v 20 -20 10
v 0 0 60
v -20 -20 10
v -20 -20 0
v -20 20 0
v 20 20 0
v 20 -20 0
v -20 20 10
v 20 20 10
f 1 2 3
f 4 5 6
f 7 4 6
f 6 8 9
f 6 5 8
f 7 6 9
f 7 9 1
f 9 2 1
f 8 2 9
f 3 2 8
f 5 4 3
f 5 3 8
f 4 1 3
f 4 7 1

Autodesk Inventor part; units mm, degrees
ref_plane "YZ Plane" through (0, 0, 0) normal (1, 0, 0) x (0, 1, 0)
ref_plane "XZ Plane" through (0, 0, 0) normal (0, 1, 0) x (-1, 0, 0)
ref_plane "XY Plane" through (0, 0, 0) normal (0, 0, 1) x (1, 0, 0)
sketch "Absorber-Base" plane through (0, 0, 0) normal (0, 0, 1) x (1, 0, 0)
  line L0 (-20, 20) -> (20, 20)
  line L1 (20, 20) -> (20, -20)
  line L2 (20, -20) -> (-20, -20)
  line L3 (-20, -20) -> (-20, 20)
  line L4 (-20, 20) -> (20, -20) construction
  line L5 (20, 20) -> (-20, -20) construction
  point P0 (0, 0)
  dimension "d0" = 40
extrude "Gesamtvolumen" add sketch "Absorber-Base" along normal blind 60
sketch "Skizze2" plane through (0, 0, 0) normal (0, 1, 0) x (-1, 0, 0)
  line L0 (-28, 0) -> (28, 0) projected
  line L1 (20, 0) -> (20, 60) projected
  line L2 (-20, 0) -> (-20, 60) projected
  line L3 (20, 0) -> (-20, 0)
  line L4 (-20, 0) -> (-20, 10)
  line L5 (-20, 10) -> (20, 10)
  line L6 (20, 10) -> (20, 0)
  line L7 (-20, 60) -> (20, 60) projected
  line L8 (0, 60) -> (20, 10)
  line L9 (0, 60) -> (-20, 10)
  point P0 (0, 0)
  point P1 (20, 10)
  dimension "d6" = 10
extrude "Cutaway" cut sketch "Skizze2" along normal mid plane 40 contours L2 L7 L9 | L8 L7 L1
pattern_circular "Runde Anordnung1" count 2 over 90 about axis through (0, 0, -10) along (0, 0, 1) of "Cutaway"
equation "\"d0\" = Base_Seitenlänge"
equation "\"d1\" = Gesamthöhe"
equation "\"d6\" = Base_Höhe"
equation "\"d7\" = Base_Seitenlänge"
equation "\"Base_Seitenlänge\" = 40"
equation "\"Base_Höhe\" = 10"
equation "\"Gesamthöhe\" = 60"
properties part number "HF-Absorber-dummy"
